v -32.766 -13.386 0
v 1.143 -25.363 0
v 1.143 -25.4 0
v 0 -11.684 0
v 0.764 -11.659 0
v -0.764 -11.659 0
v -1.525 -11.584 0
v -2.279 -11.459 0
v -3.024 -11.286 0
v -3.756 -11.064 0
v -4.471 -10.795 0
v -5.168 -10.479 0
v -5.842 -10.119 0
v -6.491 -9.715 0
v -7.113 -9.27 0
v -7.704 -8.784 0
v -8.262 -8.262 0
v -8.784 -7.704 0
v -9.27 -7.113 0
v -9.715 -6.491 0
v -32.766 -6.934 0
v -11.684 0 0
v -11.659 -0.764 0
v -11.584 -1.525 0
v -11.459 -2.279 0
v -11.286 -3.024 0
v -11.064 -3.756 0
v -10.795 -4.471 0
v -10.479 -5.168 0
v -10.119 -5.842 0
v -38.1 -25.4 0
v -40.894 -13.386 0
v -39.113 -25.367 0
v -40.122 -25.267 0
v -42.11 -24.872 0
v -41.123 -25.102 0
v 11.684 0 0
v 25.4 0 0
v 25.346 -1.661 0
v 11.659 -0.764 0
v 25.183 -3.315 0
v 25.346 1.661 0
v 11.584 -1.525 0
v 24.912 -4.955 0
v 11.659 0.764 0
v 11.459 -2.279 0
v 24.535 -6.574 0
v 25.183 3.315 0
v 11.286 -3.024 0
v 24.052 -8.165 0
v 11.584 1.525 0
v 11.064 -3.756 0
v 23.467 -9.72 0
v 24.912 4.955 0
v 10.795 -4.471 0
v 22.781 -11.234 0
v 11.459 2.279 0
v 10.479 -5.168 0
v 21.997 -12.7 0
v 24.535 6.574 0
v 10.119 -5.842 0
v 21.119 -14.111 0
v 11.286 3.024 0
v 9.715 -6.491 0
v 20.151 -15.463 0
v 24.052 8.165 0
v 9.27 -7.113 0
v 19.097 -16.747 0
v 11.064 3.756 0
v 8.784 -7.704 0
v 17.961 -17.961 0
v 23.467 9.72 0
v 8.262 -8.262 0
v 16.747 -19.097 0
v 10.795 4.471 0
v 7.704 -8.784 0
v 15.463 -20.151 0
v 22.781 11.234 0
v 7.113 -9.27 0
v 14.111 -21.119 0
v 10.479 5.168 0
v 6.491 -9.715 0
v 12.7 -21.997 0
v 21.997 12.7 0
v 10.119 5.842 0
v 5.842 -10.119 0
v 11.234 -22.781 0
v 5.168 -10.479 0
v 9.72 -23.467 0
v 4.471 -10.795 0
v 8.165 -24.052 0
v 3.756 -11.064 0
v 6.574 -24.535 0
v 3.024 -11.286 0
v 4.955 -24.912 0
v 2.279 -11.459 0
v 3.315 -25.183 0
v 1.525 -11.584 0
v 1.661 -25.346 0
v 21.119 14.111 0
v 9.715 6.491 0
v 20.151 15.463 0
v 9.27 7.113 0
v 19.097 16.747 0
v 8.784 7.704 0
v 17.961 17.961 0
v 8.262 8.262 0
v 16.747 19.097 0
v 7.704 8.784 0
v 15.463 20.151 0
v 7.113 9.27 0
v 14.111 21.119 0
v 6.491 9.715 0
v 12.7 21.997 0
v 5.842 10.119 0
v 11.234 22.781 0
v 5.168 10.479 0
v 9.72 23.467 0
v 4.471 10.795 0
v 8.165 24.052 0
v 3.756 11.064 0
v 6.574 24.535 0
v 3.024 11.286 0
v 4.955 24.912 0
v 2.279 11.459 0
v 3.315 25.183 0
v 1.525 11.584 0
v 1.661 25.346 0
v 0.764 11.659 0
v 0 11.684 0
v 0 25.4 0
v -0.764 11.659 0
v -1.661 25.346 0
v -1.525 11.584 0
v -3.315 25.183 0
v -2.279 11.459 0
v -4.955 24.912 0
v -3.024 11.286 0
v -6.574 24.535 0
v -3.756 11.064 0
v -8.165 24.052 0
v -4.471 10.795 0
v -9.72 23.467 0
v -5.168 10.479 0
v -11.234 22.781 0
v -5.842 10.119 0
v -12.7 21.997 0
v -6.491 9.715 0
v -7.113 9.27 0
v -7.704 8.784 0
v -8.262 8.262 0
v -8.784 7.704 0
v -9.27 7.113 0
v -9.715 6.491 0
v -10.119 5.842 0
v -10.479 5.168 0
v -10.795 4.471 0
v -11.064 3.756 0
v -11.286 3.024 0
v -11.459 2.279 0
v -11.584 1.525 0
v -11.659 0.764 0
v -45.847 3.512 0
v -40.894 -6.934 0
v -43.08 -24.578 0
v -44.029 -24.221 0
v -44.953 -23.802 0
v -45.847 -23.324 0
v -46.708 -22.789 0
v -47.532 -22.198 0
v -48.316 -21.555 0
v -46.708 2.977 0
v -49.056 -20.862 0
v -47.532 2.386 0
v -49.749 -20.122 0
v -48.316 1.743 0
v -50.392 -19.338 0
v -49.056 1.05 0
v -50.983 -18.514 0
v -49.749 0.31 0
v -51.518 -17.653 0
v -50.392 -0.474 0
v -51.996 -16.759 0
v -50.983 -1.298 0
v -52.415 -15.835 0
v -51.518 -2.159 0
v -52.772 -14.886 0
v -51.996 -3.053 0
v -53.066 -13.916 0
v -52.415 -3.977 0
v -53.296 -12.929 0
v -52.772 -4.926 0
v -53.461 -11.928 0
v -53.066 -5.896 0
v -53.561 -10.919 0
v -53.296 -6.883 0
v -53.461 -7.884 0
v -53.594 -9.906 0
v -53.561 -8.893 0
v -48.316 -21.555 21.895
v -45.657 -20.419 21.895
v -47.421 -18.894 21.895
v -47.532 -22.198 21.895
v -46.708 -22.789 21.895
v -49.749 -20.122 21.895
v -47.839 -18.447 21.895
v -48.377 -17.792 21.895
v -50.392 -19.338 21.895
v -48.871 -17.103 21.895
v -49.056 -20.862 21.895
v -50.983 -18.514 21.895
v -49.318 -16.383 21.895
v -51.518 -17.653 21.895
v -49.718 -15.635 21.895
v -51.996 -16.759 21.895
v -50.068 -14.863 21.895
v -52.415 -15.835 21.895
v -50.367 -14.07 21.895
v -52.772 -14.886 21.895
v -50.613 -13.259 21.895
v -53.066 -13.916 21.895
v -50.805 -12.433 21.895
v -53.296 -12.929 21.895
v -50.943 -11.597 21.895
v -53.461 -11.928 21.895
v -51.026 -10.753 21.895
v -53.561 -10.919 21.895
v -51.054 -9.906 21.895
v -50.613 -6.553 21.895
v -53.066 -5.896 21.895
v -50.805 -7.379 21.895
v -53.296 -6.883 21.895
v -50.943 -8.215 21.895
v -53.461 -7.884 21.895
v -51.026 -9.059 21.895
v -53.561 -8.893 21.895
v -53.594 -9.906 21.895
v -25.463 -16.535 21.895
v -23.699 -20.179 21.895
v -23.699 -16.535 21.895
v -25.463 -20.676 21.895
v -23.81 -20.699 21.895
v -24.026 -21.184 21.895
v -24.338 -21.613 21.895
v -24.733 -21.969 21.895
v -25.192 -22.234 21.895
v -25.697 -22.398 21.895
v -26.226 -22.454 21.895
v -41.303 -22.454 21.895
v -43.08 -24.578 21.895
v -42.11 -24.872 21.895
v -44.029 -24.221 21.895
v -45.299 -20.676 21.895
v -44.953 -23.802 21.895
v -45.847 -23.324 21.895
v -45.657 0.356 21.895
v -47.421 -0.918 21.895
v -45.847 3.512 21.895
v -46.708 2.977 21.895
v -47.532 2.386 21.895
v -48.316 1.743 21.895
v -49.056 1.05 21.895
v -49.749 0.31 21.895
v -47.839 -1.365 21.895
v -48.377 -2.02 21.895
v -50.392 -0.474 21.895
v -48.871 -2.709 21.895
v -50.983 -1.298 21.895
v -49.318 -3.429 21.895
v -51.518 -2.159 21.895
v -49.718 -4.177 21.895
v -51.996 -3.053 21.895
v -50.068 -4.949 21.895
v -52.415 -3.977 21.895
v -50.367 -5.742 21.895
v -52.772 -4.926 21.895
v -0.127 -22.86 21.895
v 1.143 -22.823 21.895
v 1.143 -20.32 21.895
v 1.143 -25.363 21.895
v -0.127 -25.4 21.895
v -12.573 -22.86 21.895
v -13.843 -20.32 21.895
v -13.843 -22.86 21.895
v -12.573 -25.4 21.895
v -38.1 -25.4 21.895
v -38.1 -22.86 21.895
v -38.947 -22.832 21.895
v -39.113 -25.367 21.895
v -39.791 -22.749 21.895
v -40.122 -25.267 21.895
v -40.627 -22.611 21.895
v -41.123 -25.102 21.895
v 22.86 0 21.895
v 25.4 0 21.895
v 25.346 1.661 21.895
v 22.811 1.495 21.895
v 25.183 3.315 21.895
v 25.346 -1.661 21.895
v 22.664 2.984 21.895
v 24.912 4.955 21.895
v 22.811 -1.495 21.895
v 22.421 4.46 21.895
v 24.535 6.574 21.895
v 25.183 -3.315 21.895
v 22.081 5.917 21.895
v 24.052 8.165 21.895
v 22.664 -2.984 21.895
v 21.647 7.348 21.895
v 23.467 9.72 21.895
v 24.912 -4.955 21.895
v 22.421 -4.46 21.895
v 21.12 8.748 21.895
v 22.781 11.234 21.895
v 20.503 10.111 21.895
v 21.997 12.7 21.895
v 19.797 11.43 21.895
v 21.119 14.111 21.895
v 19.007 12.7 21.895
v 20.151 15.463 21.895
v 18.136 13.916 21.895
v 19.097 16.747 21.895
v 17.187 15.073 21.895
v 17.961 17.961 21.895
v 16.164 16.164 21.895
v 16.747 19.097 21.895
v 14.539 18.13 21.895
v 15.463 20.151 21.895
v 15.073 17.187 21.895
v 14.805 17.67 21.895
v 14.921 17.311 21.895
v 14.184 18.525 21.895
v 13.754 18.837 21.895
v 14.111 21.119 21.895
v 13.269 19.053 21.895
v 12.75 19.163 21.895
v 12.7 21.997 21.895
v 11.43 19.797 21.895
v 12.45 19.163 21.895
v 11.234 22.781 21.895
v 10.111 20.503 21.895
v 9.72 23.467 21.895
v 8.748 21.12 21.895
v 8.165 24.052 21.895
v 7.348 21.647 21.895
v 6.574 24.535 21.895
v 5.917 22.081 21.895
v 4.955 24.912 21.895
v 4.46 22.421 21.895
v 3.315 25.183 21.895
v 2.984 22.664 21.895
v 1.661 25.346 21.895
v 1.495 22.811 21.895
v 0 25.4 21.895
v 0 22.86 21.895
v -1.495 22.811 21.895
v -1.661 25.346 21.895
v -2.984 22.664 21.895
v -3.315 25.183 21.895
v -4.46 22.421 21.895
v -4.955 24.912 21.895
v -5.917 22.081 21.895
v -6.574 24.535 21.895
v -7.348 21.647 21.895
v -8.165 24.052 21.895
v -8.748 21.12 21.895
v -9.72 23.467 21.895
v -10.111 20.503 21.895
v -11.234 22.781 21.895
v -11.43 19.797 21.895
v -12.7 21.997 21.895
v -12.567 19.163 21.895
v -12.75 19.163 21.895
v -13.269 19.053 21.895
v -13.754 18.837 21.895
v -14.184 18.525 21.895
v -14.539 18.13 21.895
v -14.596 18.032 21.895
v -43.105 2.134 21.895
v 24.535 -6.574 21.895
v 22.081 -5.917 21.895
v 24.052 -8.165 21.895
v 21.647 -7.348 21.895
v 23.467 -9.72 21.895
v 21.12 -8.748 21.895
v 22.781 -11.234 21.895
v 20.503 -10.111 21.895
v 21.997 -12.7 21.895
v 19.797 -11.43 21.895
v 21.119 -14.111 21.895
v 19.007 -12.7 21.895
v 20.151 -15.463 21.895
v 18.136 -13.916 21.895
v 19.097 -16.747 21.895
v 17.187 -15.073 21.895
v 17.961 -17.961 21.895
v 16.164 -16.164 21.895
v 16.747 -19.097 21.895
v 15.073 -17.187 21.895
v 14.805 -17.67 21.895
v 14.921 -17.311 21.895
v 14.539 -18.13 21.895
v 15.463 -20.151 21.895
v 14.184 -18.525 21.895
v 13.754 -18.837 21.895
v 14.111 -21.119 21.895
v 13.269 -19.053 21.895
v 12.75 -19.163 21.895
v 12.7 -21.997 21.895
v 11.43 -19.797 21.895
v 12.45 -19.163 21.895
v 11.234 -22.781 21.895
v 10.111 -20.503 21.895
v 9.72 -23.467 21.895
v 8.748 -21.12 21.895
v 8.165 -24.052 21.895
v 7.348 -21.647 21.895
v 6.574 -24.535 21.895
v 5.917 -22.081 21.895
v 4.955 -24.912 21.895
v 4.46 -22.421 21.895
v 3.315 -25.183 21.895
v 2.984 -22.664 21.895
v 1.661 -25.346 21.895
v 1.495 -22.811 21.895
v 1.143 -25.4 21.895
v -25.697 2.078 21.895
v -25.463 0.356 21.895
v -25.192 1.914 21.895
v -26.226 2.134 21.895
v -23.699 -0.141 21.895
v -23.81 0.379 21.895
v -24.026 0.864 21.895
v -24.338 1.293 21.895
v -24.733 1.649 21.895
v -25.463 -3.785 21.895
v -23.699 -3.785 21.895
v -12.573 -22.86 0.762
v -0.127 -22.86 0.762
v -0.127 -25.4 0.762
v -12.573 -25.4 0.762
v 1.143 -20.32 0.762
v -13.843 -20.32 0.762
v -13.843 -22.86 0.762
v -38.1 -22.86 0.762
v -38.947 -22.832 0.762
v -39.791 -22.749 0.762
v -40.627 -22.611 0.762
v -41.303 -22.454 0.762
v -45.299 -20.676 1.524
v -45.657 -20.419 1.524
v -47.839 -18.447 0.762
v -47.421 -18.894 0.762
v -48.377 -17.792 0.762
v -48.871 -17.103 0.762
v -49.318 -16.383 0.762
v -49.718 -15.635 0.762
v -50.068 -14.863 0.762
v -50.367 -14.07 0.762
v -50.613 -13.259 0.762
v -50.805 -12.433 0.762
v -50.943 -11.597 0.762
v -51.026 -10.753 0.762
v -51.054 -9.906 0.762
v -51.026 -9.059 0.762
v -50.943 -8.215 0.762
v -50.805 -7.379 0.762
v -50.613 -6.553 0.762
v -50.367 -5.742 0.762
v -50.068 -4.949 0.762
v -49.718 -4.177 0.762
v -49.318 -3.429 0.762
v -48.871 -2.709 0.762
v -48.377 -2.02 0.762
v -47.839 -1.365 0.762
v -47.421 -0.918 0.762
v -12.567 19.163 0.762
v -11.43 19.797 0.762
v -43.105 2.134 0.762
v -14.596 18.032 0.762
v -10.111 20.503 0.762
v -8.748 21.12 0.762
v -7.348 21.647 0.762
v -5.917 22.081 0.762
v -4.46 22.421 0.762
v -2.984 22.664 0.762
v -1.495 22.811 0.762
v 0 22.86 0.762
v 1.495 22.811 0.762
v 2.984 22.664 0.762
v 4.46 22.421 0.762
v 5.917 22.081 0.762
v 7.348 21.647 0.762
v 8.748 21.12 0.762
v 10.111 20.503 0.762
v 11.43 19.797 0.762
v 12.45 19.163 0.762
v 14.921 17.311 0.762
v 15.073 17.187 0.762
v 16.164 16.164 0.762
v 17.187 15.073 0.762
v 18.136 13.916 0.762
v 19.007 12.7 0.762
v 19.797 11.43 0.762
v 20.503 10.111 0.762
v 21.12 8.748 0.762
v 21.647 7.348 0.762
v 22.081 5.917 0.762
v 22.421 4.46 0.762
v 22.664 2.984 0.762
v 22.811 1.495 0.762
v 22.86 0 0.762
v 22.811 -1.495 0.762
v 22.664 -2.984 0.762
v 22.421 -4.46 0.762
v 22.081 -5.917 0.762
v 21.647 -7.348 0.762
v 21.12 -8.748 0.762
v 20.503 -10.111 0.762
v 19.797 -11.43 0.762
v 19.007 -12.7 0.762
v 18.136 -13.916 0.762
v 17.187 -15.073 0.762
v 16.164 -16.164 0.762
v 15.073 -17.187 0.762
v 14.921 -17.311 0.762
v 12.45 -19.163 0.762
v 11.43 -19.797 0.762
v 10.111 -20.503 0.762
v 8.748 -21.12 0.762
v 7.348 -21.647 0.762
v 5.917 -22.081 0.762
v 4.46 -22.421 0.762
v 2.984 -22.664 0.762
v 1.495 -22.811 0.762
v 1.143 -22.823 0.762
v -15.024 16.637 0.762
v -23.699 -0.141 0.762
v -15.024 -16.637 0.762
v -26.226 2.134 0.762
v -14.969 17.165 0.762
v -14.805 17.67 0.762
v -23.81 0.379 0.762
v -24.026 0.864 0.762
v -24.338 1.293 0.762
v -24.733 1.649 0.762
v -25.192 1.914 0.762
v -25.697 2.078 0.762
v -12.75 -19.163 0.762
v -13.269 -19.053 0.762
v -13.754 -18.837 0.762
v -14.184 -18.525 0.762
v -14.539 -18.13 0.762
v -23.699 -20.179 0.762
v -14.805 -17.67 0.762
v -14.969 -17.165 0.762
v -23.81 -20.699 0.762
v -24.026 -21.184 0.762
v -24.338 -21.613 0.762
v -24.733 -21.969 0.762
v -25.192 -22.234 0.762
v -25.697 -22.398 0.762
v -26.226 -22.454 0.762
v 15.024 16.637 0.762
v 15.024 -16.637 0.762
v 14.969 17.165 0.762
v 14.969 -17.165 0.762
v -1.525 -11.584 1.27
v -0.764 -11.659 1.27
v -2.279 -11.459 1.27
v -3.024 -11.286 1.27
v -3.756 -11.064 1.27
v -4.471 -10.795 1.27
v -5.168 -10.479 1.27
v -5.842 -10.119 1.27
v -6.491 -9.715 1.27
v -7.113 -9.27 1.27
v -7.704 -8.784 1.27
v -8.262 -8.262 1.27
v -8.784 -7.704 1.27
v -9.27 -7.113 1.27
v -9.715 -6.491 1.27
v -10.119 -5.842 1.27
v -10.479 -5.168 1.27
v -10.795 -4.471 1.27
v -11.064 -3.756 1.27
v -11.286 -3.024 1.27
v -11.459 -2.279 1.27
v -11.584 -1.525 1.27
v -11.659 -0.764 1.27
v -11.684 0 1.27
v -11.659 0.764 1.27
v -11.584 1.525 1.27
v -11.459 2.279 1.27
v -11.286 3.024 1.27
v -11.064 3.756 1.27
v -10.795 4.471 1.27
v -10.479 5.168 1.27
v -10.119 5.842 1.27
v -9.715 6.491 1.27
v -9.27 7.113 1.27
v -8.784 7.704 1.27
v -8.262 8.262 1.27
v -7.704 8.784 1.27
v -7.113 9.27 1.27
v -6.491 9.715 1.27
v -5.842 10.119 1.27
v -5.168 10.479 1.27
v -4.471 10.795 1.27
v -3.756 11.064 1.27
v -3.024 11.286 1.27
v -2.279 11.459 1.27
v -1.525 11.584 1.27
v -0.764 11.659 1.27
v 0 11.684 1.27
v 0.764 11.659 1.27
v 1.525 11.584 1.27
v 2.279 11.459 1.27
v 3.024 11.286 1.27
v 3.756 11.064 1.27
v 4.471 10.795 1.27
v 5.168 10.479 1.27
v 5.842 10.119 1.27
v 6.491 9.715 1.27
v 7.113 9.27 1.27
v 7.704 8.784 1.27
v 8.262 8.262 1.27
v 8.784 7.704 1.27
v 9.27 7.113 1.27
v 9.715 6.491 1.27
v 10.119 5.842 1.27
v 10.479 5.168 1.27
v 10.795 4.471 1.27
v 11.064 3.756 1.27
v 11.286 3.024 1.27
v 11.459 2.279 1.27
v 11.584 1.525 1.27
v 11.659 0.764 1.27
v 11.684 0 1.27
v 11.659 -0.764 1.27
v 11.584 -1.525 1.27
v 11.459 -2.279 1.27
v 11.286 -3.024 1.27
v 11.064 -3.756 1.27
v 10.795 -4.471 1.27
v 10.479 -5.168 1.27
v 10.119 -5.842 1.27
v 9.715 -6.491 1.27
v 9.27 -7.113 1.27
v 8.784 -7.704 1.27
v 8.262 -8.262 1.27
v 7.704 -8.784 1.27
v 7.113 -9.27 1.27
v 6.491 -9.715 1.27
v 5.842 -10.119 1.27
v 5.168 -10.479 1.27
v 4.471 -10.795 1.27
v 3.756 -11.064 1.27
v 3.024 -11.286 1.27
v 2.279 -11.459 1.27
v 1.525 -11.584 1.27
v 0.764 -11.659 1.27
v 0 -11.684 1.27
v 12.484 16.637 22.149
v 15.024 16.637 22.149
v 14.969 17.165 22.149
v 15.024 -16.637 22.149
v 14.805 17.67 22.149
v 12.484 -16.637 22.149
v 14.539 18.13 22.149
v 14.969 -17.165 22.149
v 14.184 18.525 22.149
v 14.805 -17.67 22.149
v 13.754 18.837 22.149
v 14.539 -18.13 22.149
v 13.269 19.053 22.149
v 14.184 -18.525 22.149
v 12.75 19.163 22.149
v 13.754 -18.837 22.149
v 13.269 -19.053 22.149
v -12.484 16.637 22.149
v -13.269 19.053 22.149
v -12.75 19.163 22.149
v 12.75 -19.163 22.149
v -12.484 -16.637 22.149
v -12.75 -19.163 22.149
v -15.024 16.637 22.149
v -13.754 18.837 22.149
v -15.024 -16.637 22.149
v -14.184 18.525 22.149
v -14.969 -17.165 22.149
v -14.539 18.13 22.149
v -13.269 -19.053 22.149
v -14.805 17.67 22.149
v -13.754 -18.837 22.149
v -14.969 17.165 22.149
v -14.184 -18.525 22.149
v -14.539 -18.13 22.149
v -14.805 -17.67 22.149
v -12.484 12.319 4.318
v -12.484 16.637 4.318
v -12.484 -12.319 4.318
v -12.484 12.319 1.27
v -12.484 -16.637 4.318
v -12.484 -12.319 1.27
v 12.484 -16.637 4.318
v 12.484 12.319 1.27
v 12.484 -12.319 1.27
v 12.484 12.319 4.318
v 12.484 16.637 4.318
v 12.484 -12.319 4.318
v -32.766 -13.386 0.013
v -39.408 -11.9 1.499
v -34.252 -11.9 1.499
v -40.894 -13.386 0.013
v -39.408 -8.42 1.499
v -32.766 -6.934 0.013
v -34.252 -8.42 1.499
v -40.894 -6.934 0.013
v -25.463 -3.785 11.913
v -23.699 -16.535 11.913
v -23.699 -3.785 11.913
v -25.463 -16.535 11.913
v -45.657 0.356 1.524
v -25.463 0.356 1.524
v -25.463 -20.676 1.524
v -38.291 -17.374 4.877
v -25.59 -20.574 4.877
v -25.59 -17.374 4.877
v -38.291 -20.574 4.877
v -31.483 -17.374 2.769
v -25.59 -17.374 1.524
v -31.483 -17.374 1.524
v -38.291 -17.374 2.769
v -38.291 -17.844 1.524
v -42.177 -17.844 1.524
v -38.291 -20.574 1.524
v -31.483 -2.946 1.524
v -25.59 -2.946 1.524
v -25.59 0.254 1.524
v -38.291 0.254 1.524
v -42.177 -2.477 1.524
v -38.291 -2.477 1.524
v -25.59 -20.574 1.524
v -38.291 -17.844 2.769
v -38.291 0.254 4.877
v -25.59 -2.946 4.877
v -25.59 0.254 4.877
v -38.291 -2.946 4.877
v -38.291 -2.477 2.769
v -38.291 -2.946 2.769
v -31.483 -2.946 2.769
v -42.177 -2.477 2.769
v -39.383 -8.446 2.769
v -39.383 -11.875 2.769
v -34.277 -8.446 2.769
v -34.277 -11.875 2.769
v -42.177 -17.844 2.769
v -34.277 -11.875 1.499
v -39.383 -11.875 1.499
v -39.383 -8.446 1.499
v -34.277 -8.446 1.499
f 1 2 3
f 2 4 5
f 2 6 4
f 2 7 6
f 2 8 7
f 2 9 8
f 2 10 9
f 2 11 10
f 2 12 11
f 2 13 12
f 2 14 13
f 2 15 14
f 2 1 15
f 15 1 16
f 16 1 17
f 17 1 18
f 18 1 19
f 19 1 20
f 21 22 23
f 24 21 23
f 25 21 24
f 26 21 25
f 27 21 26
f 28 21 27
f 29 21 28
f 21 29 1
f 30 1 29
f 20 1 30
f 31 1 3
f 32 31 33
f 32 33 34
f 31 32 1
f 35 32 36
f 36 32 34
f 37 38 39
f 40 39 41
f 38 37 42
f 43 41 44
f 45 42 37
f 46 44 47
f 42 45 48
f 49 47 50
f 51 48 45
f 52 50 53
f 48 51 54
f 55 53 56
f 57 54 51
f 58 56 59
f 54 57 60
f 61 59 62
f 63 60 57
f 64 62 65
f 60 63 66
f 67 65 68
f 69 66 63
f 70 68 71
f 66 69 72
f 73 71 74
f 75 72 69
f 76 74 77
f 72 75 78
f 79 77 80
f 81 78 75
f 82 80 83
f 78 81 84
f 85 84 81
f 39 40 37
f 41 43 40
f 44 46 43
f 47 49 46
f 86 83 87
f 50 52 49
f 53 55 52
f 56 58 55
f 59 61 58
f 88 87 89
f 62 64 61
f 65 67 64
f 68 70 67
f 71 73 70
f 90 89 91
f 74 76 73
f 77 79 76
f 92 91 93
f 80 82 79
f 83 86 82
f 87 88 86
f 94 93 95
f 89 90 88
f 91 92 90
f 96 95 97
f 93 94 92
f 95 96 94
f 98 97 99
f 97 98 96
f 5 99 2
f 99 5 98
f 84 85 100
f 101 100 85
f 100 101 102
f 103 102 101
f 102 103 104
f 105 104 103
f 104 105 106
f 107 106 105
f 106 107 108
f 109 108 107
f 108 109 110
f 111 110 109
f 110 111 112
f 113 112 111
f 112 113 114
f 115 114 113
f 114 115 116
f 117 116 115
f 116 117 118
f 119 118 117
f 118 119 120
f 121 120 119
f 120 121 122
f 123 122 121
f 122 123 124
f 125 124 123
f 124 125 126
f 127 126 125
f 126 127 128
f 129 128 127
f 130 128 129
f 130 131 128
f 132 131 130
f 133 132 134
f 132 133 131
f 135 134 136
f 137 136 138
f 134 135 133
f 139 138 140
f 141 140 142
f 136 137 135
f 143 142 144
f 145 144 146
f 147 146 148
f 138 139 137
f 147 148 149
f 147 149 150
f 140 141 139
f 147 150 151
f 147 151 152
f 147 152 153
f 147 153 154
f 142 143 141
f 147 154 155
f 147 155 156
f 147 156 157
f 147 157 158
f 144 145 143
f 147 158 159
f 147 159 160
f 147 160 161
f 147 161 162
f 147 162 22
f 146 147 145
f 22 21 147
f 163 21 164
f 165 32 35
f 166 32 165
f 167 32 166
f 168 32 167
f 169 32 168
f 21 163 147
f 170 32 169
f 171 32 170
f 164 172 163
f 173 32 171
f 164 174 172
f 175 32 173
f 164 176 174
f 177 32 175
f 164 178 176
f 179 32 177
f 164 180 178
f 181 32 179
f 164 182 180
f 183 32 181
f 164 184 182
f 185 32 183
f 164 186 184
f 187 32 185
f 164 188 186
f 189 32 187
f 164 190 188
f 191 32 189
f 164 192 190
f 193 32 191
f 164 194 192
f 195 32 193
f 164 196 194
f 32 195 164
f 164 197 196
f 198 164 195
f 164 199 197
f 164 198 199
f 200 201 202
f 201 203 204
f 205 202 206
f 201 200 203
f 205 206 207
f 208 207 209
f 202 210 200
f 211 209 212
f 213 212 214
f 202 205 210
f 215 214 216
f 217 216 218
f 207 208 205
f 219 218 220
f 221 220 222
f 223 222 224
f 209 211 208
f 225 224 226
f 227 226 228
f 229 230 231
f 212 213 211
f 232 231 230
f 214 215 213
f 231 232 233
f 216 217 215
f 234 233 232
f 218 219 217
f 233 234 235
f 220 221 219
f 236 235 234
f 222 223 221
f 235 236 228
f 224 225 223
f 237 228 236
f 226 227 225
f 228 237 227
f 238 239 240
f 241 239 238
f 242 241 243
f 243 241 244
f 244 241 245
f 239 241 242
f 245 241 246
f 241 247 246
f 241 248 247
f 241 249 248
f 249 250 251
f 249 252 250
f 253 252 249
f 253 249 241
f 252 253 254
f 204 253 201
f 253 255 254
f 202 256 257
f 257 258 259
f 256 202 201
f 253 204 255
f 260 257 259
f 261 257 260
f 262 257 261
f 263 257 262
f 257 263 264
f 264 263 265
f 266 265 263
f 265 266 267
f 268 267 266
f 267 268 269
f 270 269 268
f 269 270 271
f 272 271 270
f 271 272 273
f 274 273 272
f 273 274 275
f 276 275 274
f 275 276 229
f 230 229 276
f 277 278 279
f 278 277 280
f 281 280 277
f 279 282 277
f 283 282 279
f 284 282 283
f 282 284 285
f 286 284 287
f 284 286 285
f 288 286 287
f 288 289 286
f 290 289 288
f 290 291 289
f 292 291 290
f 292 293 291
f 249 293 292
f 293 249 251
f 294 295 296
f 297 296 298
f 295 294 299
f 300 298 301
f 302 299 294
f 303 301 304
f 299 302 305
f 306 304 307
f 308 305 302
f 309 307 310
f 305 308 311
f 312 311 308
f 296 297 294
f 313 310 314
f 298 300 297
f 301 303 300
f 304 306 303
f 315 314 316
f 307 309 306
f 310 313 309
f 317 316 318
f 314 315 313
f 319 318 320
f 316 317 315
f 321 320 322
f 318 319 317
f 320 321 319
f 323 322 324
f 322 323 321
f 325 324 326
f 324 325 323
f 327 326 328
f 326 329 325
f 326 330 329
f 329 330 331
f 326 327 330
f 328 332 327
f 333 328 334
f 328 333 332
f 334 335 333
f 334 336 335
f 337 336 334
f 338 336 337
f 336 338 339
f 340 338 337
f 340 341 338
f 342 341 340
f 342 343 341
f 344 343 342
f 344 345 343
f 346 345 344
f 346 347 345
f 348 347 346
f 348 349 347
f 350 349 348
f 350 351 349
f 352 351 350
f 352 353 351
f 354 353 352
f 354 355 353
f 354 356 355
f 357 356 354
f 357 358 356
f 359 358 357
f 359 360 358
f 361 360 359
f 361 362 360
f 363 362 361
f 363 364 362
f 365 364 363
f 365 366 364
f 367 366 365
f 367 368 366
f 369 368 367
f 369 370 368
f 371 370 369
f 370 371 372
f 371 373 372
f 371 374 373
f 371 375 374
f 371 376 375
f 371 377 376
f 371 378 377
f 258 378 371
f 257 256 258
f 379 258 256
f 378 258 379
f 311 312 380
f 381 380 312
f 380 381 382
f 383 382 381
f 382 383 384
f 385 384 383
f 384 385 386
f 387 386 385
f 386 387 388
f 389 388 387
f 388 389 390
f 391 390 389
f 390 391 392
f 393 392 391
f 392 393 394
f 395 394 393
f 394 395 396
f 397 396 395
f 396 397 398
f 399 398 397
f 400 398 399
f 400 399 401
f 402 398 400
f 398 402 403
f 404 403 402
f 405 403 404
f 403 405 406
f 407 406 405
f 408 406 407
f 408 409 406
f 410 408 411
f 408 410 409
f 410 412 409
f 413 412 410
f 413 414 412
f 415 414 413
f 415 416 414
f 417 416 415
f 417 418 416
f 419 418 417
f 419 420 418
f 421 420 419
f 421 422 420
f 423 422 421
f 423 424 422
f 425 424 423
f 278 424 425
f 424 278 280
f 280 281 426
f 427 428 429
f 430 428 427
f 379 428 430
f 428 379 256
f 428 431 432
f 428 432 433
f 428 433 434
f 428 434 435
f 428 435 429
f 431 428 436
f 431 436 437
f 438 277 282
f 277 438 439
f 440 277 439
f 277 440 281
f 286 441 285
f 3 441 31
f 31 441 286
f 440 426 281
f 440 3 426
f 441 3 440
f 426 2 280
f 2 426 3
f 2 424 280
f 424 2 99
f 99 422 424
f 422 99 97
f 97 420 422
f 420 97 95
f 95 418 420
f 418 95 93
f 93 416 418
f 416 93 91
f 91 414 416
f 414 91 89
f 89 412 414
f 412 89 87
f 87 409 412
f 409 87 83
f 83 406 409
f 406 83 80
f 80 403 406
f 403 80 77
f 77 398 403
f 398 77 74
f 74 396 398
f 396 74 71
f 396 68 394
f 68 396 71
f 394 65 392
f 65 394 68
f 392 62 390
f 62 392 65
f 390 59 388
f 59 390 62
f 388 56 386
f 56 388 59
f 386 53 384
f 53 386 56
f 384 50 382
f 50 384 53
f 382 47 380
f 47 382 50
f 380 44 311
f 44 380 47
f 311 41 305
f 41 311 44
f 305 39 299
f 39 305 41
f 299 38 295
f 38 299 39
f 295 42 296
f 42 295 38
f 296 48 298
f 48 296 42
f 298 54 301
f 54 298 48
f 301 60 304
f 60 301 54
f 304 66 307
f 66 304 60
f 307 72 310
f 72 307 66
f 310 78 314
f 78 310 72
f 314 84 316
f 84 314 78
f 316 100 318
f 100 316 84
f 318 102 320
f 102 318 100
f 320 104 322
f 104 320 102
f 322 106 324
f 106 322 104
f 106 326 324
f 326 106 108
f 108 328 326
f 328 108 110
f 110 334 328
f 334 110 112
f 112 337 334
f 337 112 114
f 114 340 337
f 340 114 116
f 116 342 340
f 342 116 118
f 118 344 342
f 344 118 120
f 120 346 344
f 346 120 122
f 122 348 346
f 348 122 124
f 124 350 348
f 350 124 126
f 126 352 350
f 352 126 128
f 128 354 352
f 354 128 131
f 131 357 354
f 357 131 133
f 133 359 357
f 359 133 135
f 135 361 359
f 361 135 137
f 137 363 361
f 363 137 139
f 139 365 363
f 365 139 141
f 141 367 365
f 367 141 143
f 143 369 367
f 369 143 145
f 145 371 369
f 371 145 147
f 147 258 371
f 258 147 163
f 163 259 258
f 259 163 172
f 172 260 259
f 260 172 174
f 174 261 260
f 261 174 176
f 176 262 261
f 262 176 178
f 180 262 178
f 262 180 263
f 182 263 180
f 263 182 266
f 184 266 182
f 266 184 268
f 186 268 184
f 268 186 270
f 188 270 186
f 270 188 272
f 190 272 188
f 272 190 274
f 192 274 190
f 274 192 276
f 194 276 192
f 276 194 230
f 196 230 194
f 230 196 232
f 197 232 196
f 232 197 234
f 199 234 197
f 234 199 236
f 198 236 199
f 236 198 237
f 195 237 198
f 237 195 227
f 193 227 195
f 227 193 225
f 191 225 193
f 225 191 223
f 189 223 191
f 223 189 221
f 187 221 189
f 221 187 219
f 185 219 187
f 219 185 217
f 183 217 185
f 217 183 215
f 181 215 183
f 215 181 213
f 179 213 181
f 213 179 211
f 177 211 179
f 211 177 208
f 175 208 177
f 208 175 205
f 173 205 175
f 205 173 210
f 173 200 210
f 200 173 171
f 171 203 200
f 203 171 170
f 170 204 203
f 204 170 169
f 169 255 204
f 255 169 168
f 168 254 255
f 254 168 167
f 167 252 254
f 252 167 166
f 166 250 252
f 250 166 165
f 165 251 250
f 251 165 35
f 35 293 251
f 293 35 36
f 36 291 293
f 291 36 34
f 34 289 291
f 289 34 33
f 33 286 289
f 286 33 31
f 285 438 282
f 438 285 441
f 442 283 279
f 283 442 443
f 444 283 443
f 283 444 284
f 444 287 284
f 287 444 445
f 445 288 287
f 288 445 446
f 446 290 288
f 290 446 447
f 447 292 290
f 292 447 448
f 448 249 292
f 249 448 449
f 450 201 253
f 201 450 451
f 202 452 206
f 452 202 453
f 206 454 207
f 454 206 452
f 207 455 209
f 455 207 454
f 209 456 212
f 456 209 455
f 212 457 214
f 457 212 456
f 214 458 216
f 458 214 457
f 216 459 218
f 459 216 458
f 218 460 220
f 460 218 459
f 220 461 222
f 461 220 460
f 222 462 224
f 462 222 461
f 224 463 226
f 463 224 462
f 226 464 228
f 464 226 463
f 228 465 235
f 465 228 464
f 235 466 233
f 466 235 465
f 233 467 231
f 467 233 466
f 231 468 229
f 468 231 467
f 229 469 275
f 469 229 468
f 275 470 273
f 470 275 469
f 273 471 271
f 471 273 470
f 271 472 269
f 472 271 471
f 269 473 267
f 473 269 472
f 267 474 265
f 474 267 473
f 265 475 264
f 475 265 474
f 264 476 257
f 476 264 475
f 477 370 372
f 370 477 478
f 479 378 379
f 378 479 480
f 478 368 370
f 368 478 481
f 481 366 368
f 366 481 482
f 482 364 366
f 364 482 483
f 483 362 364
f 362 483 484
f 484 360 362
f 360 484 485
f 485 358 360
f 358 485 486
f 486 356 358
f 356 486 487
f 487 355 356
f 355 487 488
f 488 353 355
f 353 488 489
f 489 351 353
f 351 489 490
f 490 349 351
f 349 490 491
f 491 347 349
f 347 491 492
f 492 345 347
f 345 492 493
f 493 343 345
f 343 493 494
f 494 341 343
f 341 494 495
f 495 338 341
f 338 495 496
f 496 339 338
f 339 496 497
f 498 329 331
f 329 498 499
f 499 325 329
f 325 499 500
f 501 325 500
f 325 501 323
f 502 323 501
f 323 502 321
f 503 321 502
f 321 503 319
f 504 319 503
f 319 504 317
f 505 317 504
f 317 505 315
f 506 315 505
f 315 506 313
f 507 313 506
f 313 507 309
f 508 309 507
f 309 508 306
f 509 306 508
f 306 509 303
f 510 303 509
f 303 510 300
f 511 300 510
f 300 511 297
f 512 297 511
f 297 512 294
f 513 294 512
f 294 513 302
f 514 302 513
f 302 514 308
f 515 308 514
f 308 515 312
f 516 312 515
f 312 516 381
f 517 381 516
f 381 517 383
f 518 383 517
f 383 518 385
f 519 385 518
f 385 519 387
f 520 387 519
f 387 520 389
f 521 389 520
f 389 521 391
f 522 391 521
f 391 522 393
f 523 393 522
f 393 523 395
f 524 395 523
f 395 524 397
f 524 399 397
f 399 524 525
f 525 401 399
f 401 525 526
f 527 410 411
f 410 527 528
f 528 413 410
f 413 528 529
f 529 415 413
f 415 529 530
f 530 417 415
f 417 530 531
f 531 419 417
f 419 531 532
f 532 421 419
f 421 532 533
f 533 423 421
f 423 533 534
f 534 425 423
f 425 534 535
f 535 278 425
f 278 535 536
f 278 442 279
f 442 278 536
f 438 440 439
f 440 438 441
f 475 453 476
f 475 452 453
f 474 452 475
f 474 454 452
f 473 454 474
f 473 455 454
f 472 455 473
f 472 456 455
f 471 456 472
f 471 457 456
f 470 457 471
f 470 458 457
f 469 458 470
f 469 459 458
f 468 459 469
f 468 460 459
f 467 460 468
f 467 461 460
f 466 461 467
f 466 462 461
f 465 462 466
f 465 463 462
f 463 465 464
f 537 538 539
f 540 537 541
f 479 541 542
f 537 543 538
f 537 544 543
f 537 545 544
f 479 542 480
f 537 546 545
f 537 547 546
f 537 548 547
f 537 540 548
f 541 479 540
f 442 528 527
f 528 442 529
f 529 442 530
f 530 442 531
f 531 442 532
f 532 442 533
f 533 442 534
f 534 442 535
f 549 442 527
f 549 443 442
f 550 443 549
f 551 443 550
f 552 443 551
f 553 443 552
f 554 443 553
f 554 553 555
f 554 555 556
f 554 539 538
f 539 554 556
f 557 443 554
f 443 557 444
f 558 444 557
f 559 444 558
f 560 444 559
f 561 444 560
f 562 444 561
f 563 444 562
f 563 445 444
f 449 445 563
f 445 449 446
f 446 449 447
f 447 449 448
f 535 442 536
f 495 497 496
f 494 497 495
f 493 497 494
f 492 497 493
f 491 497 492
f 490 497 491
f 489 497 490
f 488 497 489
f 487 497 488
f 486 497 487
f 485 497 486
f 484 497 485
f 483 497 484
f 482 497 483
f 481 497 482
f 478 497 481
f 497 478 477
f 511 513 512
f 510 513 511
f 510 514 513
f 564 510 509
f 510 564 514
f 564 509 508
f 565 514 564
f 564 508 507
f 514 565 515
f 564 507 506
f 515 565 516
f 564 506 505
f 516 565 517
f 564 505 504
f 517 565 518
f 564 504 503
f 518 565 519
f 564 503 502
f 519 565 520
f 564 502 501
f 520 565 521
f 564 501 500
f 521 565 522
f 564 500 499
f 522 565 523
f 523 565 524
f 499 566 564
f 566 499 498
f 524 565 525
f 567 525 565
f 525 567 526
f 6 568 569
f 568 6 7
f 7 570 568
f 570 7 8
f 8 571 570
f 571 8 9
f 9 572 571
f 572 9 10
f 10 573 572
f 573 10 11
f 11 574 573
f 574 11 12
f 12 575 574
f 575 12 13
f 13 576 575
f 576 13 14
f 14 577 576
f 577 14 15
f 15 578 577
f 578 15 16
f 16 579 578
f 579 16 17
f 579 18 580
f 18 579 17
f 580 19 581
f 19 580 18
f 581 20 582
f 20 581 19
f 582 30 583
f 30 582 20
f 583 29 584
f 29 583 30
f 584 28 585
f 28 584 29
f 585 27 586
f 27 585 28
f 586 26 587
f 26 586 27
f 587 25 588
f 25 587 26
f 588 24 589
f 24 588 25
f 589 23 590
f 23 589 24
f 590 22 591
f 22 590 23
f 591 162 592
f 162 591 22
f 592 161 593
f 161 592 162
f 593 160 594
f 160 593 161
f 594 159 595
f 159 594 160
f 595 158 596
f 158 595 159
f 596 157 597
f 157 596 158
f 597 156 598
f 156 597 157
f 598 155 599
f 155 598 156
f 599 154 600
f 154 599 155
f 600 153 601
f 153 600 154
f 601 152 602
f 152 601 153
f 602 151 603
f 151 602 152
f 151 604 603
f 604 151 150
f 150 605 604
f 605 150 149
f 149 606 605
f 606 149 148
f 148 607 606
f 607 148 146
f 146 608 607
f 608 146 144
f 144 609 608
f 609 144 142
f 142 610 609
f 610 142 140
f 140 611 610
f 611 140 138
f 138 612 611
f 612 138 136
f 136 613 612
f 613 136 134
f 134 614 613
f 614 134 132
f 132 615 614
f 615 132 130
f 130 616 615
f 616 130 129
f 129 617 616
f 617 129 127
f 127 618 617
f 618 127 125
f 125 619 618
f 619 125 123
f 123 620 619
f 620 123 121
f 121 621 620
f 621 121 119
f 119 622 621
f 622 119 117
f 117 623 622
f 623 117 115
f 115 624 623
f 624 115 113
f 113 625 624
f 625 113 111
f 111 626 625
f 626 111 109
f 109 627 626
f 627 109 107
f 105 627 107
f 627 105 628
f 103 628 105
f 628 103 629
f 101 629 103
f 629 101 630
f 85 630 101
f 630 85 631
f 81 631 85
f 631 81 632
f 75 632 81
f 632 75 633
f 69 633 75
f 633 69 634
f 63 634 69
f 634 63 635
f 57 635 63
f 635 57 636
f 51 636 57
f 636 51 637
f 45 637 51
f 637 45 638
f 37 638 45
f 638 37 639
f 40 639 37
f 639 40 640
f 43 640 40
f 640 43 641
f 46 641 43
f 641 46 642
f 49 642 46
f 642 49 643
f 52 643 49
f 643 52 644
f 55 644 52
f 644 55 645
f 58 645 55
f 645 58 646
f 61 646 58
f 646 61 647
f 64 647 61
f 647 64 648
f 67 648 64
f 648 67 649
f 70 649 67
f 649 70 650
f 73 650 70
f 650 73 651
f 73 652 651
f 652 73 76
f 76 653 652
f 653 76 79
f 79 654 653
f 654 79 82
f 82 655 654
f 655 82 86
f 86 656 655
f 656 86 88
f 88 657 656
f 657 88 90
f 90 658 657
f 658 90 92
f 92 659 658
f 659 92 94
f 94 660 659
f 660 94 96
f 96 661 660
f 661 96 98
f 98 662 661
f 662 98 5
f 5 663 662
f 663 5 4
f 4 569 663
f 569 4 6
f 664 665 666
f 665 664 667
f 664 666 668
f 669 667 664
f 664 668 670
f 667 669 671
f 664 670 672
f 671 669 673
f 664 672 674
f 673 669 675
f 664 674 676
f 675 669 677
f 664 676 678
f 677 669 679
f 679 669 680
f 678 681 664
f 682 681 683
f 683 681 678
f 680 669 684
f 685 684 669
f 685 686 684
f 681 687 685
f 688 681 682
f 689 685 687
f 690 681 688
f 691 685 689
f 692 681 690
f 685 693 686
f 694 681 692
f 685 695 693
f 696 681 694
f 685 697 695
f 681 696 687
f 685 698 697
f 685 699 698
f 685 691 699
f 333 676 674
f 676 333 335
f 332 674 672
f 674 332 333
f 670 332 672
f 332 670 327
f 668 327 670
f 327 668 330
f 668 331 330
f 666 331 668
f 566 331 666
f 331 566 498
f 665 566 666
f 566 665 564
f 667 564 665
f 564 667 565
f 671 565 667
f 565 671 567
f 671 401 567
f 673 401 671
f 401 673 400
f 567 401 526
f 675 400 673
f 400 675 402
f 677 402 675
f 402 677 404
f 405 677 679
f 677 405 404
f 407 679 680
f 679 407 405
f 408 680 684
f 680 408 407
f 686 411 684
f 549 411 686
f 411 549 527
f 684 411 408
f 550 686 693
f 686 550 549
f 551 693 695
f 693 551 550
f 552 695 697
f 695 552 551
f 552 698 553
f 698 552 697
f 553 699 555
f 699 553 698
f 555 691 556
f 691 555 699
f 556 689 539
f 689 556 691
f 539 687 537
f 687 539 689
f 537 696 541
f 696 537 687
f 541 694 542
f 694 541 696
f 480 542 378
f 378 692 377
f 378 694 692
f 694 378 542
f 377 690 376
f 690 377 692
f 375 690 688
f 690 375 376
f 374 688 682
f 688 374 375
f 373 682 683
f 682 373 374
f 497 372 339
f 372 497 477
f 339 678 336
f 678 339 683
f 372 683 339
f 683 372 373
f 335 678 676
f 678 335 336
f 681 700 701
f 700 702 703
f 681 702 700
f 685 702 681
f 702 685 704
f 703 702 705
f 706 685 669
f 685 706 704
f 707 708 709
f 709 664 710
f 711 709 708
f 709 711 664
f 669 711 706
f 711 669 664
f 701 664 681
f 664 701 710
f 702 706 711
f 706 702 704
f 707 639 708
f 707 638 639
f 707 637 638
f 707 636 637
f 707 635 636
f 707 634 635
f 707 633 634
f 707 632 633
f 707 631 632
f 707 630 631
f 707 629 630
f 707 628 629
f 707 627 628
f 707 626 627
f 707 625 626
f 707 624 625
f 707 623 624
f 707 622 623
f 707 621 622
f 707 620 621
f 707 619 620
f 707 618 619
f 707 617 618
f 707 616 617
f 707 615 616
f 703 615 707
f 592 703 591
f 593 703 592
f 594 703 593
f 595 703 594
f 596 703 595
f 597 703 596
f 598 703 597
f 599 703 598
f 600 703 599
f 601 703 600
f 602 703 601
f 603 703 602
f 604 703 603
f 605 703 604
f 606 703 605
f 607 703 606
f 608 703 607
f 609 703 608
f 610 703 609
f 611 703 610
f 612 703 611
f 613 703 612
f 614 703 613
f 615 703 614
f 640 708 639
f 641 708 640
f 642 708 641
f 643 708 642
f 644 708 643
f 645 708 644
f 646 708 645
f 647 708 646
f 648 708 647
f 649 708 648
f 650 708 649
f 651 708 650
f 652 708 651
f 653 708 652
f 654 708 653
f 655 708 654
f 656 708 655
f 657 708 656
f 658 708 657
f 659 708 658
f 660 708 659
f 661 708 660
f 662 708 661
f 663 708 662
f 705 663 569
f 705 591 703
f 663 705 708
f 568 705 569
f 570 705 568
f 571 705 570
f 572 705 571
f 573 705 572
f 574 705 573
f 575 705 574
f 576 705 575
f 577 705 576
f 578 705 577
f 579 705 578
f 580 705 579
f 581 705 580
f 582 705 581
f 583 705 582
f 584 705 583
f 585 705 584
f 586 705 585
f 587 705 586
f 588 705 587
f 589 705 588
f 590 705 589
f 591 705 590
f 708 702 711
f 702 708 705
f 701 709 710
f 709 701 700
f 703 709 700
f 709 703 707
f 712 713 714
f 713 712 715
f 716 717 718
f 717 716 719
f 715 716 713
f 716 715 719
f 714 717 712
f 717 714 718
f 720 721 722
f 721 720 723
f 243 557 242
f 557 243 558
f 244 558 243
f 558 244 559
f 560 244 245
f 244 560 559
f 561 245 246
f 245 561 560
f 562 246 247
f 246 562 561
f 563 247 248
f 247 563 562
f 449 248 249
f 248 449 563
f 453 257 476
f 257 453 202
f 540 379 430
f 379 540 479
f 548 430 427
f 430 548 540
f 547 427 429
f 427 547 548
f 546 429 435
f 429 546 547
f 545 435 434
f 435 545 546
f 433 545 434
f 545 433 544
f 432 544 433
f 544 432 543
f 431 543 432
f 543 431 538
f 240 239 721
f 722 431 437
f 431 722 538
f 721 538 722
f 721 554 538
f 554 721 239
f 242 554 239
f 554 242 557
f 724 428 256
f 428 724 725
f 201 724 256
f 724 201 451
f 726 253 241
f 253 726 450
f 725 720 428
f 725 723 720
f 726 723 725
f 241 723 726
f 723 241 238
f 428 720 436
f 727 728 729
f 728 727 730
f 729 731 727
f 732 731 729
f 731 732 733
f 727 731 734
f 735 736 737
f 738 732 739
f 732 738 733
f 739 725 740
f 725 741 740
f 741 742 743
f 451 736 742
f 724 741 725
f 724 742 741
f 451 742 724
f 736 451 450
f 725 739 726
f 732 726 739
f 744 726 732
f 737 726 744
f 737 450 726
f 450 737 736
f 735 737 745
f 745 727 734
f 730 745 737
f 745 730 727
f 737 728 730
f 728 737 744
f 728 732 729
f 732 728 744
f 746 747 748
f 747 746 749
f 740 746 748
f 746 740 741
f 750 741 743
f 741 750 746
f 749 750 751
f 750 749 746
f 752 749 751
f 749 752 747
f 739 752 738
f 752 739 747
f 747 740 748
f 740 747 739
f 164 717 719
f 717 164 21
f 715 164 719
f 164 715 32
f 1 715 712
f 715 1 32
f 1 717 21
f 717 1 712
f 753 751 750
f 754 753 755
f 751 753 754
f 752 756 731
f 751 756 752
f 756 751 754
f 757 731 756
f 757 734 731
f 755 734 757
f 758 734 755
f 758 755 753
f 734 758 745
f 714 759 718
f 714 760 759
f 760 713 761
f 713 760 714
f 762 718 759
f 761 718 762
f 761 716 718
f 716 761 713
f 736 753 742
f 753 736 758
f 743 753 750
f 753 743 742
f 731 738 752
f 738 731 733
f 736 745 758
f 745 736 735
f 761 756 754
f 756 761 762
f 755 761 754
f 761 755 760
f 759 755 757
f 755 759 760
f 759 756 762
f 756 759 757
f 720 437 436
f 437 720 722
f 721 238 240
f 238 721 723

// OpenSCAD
// file: model_adps9660.scad
module ADPS9660Carrier()
{
    color("CornflowerBlue")
    {
    // pcb + midboard
    linear_extrude(200)
    square([788, 755], center=true);

    // usb 
    translate([0, -755/2-422/2, 0])
    linear_extrude(83)
    square([482, 422], center=true);

    // solder joints on to of midboard
    translate([0, 422-120, 200])
    linear_extrude(75)
    square([606, 120], center=true);

    // solder joints under midboard
    translate([0, 422-120, -75])
    linear_extrude(75)
    square([606, 120], center=true);

    // APDS9660 carrier
    translate([0, -(755-521)/2+35, 200])
    linear_extrude(177)
    square([532, 521], center=true);

    // solder joints on carrier 
    translate([0, -(755-120)/2+35, 377])
    linear_extrude(75)
    square([532, 120], center=true);

    // left lower header base
    translate([-(568+100)/2, -(600-422)/2+20, -100])
    linear_extrude(100)
    square([100, 600], center=true);

    // right lower header base
    translate([(568+100)/2, -(600-422)/2+20, -100])
    linear_extrude(100)
    square([100, 600], center=true);

    // left lower headers
    translate([-(568+100)/2, -(600-422)/2+20, -320])
    linear_extrude(220)
    square([28, 524], center=true);

    // right lower header base
    translate([(568+100)/2, -(600-422)/2+20, -320])
    linear_extrude(220)
    square([28, 524], center=true);
    }

    color("OrangeRed")
    {
    // APDS9660 sensor
    translate([0, 521/2-161, 377])
    linear_extrude(56)
    square([95, 161], center=true);
    }
}
// main file
use <model_adps9660.scad>

ViewScale = [0.0254, 0.0254, 0.0254];

module fpEdge(r1, r2)
{
    hull() {
    // PIR detector
    circle(r1, $fn=96);
    // Gesture sensor
    //translate([-900-710, -900+710, 0])
    translate([-1500, -900+510, 0])
    circle(r2, $fn=96);
    }
}


module faceplate()
{
    linear_extrude(862)
    translate([0, 0, 30])
    {
        difference(){
            fpEdge(1000, 610);
            fpEdge(900, 510); 
            difference() {
            translate([-250, -900, 0])
            square([590, 200], center=true);
            }
            translate([-250, -950, 0])
            square([490, 100], center=true);
        }
        difference() {
        translate([-250, -900, 0])
        square([590, 200], center=true);
        translate([-250, -950, 0])
        square([490, 100], center=true);
        }
    }
    linear_extrude(30)
    difference() {
    fpEdge(1000, 610);
    circle(460, $fn=96);
    translate([-1450, -400, 0])
    square([321, 255], center=true);
    }

    // clip rails
    //translate([795/2+175-50, 295]) square([100, 100], center=true);
    //translate([795/2+175-50, -295]) square([100, 100], center=true);
}

// ----------------------------------------------------------------
//
// PIR Detector Housing
//
// ----------------------------------------------------------------
module rectHull(r, x, y)
{
    hull()
    {
        translate([(-x/2)+r, (-y/2)+r, 0]) circle(r=r);
        translate([(x/2)-r, (-y/2)+r, 0]) circle(r=r);
        translate([(-x/2)+r, (y/2)-r, 0]) circle(r=r);
        translate([(x/2)-r, (y/2)-r, 0]) circle(r=r);
    }
}

module enclosure_pirDetector()
{
    // outside cover
    linear_extrude(872) 
    difference() {
        rectHull(100, 1183, 1510);
       #square([983, 1310], center=true);
    }

    // Right support
    translate([0, (1280-140)/2, 350+65+227+60])
    linear_extrude(120)
    square([1000, 170], center=true);

    // Left support
    translate([0, -(1280-140)/2, 350+65+227+60])
    linear_extrude(120)
    square([1000, 170], center=true);

    // Dome base
    translate([0, 0, 762+60])
    linear_extrude(50)
    difference() {
        rectHull(100, 1183, 1510);
        circle(460, $fn=96);
    }
}

// ----------------------------------------------------------------
//
// Gesture Sensor Housing
//
// ----------------------------------------------------------------
module side(l,d)
{
    rotate([90, 0, 0])
    translate([-d, 0, -l/2])
    linear_extrude(l)
    polygon(points=[[0, 0], [d, 0],[d, d]]);
}

module sides(w, h, d)
{
    union() {
   translate([h/2, 0, 0])  rotate([0, 0, 0]) side(w,d);
   translate([-h/2, 0, 0])  rotate([0, 0, 180]) side(w,d);

   translate([0, w/2, 0])  rotate([0, 0, 90]) side(h,d);
   translate([0, -w/2, 0])  rotate([0, 0, -90]) side(h,d);
    }
}

module enclosure_gestureSensor()
{
    // main pcb surround
    translate([0, 0, 93])
    linear_extrude(469)
    {
    difference() {
    translate([0, 0, 0])
    rectHull(100, 968, 935);
    square([828, 795], center=true);
    }
    }

    // right support
    translate([(788-100)/2+3, -(755-500)/2-15, 300+70])
    linear_extrude(132)
    square([126, 500], center=true);

    // left support
    translate([-(788-100)/2-3, -(755-500)/2-15, 300+70])
    linear_extrude(132)
    square([126, 500], center=true);

    // cover
    translate([0, 0, 462+40])
    linear_extrude(60)
    difference() {
    rectHull(100, 968, 935);
    translate([0, 50, 0])
    square([254, 320], center=true);
    }

    // mounting around sensor
    // w,h,d 
    translate([0, 50, 432+70])
    {
        sides(321, 255, 60);
    }

    // mounting support
    translate([0, 50, 383+70])
    linear_extrude(50)
    difference() {
        square([605, 421], center=true);
        square([135, 201], center=true);
    }

    // surround with cutout for usb
    translate([0, 0, -300])
    linear_extrude(403) {
    difference() {
    translate([0, 0, 0])
    rectHull(100, 968, 935);
    square([828, 795], center=true);
    translate([0, -(755)/2, 0])
    square([502, 200], center=true);
    }
    // clip rails
    //translate([795/2+175-50, 295]) square([100, 100], center=true);
    //translate([795/2+175-50, -295]) square([100, 100], center=true);
    }
}

scale(ViewScale)
{
    //linear_extrude(900)
    faceplate();
    translate([0, 0, 872])
    rotate([180, 0, 0])
    enclosure_pirDetector();

    //translate([-900-710, 0, 562])
    translate([-1400, -400, 562])
    rotate([180, 0, -90])
    enclosure_gestureSensor();
//    translate([0, 0, 453-65])
//    ADPS9660Carrier();
}
